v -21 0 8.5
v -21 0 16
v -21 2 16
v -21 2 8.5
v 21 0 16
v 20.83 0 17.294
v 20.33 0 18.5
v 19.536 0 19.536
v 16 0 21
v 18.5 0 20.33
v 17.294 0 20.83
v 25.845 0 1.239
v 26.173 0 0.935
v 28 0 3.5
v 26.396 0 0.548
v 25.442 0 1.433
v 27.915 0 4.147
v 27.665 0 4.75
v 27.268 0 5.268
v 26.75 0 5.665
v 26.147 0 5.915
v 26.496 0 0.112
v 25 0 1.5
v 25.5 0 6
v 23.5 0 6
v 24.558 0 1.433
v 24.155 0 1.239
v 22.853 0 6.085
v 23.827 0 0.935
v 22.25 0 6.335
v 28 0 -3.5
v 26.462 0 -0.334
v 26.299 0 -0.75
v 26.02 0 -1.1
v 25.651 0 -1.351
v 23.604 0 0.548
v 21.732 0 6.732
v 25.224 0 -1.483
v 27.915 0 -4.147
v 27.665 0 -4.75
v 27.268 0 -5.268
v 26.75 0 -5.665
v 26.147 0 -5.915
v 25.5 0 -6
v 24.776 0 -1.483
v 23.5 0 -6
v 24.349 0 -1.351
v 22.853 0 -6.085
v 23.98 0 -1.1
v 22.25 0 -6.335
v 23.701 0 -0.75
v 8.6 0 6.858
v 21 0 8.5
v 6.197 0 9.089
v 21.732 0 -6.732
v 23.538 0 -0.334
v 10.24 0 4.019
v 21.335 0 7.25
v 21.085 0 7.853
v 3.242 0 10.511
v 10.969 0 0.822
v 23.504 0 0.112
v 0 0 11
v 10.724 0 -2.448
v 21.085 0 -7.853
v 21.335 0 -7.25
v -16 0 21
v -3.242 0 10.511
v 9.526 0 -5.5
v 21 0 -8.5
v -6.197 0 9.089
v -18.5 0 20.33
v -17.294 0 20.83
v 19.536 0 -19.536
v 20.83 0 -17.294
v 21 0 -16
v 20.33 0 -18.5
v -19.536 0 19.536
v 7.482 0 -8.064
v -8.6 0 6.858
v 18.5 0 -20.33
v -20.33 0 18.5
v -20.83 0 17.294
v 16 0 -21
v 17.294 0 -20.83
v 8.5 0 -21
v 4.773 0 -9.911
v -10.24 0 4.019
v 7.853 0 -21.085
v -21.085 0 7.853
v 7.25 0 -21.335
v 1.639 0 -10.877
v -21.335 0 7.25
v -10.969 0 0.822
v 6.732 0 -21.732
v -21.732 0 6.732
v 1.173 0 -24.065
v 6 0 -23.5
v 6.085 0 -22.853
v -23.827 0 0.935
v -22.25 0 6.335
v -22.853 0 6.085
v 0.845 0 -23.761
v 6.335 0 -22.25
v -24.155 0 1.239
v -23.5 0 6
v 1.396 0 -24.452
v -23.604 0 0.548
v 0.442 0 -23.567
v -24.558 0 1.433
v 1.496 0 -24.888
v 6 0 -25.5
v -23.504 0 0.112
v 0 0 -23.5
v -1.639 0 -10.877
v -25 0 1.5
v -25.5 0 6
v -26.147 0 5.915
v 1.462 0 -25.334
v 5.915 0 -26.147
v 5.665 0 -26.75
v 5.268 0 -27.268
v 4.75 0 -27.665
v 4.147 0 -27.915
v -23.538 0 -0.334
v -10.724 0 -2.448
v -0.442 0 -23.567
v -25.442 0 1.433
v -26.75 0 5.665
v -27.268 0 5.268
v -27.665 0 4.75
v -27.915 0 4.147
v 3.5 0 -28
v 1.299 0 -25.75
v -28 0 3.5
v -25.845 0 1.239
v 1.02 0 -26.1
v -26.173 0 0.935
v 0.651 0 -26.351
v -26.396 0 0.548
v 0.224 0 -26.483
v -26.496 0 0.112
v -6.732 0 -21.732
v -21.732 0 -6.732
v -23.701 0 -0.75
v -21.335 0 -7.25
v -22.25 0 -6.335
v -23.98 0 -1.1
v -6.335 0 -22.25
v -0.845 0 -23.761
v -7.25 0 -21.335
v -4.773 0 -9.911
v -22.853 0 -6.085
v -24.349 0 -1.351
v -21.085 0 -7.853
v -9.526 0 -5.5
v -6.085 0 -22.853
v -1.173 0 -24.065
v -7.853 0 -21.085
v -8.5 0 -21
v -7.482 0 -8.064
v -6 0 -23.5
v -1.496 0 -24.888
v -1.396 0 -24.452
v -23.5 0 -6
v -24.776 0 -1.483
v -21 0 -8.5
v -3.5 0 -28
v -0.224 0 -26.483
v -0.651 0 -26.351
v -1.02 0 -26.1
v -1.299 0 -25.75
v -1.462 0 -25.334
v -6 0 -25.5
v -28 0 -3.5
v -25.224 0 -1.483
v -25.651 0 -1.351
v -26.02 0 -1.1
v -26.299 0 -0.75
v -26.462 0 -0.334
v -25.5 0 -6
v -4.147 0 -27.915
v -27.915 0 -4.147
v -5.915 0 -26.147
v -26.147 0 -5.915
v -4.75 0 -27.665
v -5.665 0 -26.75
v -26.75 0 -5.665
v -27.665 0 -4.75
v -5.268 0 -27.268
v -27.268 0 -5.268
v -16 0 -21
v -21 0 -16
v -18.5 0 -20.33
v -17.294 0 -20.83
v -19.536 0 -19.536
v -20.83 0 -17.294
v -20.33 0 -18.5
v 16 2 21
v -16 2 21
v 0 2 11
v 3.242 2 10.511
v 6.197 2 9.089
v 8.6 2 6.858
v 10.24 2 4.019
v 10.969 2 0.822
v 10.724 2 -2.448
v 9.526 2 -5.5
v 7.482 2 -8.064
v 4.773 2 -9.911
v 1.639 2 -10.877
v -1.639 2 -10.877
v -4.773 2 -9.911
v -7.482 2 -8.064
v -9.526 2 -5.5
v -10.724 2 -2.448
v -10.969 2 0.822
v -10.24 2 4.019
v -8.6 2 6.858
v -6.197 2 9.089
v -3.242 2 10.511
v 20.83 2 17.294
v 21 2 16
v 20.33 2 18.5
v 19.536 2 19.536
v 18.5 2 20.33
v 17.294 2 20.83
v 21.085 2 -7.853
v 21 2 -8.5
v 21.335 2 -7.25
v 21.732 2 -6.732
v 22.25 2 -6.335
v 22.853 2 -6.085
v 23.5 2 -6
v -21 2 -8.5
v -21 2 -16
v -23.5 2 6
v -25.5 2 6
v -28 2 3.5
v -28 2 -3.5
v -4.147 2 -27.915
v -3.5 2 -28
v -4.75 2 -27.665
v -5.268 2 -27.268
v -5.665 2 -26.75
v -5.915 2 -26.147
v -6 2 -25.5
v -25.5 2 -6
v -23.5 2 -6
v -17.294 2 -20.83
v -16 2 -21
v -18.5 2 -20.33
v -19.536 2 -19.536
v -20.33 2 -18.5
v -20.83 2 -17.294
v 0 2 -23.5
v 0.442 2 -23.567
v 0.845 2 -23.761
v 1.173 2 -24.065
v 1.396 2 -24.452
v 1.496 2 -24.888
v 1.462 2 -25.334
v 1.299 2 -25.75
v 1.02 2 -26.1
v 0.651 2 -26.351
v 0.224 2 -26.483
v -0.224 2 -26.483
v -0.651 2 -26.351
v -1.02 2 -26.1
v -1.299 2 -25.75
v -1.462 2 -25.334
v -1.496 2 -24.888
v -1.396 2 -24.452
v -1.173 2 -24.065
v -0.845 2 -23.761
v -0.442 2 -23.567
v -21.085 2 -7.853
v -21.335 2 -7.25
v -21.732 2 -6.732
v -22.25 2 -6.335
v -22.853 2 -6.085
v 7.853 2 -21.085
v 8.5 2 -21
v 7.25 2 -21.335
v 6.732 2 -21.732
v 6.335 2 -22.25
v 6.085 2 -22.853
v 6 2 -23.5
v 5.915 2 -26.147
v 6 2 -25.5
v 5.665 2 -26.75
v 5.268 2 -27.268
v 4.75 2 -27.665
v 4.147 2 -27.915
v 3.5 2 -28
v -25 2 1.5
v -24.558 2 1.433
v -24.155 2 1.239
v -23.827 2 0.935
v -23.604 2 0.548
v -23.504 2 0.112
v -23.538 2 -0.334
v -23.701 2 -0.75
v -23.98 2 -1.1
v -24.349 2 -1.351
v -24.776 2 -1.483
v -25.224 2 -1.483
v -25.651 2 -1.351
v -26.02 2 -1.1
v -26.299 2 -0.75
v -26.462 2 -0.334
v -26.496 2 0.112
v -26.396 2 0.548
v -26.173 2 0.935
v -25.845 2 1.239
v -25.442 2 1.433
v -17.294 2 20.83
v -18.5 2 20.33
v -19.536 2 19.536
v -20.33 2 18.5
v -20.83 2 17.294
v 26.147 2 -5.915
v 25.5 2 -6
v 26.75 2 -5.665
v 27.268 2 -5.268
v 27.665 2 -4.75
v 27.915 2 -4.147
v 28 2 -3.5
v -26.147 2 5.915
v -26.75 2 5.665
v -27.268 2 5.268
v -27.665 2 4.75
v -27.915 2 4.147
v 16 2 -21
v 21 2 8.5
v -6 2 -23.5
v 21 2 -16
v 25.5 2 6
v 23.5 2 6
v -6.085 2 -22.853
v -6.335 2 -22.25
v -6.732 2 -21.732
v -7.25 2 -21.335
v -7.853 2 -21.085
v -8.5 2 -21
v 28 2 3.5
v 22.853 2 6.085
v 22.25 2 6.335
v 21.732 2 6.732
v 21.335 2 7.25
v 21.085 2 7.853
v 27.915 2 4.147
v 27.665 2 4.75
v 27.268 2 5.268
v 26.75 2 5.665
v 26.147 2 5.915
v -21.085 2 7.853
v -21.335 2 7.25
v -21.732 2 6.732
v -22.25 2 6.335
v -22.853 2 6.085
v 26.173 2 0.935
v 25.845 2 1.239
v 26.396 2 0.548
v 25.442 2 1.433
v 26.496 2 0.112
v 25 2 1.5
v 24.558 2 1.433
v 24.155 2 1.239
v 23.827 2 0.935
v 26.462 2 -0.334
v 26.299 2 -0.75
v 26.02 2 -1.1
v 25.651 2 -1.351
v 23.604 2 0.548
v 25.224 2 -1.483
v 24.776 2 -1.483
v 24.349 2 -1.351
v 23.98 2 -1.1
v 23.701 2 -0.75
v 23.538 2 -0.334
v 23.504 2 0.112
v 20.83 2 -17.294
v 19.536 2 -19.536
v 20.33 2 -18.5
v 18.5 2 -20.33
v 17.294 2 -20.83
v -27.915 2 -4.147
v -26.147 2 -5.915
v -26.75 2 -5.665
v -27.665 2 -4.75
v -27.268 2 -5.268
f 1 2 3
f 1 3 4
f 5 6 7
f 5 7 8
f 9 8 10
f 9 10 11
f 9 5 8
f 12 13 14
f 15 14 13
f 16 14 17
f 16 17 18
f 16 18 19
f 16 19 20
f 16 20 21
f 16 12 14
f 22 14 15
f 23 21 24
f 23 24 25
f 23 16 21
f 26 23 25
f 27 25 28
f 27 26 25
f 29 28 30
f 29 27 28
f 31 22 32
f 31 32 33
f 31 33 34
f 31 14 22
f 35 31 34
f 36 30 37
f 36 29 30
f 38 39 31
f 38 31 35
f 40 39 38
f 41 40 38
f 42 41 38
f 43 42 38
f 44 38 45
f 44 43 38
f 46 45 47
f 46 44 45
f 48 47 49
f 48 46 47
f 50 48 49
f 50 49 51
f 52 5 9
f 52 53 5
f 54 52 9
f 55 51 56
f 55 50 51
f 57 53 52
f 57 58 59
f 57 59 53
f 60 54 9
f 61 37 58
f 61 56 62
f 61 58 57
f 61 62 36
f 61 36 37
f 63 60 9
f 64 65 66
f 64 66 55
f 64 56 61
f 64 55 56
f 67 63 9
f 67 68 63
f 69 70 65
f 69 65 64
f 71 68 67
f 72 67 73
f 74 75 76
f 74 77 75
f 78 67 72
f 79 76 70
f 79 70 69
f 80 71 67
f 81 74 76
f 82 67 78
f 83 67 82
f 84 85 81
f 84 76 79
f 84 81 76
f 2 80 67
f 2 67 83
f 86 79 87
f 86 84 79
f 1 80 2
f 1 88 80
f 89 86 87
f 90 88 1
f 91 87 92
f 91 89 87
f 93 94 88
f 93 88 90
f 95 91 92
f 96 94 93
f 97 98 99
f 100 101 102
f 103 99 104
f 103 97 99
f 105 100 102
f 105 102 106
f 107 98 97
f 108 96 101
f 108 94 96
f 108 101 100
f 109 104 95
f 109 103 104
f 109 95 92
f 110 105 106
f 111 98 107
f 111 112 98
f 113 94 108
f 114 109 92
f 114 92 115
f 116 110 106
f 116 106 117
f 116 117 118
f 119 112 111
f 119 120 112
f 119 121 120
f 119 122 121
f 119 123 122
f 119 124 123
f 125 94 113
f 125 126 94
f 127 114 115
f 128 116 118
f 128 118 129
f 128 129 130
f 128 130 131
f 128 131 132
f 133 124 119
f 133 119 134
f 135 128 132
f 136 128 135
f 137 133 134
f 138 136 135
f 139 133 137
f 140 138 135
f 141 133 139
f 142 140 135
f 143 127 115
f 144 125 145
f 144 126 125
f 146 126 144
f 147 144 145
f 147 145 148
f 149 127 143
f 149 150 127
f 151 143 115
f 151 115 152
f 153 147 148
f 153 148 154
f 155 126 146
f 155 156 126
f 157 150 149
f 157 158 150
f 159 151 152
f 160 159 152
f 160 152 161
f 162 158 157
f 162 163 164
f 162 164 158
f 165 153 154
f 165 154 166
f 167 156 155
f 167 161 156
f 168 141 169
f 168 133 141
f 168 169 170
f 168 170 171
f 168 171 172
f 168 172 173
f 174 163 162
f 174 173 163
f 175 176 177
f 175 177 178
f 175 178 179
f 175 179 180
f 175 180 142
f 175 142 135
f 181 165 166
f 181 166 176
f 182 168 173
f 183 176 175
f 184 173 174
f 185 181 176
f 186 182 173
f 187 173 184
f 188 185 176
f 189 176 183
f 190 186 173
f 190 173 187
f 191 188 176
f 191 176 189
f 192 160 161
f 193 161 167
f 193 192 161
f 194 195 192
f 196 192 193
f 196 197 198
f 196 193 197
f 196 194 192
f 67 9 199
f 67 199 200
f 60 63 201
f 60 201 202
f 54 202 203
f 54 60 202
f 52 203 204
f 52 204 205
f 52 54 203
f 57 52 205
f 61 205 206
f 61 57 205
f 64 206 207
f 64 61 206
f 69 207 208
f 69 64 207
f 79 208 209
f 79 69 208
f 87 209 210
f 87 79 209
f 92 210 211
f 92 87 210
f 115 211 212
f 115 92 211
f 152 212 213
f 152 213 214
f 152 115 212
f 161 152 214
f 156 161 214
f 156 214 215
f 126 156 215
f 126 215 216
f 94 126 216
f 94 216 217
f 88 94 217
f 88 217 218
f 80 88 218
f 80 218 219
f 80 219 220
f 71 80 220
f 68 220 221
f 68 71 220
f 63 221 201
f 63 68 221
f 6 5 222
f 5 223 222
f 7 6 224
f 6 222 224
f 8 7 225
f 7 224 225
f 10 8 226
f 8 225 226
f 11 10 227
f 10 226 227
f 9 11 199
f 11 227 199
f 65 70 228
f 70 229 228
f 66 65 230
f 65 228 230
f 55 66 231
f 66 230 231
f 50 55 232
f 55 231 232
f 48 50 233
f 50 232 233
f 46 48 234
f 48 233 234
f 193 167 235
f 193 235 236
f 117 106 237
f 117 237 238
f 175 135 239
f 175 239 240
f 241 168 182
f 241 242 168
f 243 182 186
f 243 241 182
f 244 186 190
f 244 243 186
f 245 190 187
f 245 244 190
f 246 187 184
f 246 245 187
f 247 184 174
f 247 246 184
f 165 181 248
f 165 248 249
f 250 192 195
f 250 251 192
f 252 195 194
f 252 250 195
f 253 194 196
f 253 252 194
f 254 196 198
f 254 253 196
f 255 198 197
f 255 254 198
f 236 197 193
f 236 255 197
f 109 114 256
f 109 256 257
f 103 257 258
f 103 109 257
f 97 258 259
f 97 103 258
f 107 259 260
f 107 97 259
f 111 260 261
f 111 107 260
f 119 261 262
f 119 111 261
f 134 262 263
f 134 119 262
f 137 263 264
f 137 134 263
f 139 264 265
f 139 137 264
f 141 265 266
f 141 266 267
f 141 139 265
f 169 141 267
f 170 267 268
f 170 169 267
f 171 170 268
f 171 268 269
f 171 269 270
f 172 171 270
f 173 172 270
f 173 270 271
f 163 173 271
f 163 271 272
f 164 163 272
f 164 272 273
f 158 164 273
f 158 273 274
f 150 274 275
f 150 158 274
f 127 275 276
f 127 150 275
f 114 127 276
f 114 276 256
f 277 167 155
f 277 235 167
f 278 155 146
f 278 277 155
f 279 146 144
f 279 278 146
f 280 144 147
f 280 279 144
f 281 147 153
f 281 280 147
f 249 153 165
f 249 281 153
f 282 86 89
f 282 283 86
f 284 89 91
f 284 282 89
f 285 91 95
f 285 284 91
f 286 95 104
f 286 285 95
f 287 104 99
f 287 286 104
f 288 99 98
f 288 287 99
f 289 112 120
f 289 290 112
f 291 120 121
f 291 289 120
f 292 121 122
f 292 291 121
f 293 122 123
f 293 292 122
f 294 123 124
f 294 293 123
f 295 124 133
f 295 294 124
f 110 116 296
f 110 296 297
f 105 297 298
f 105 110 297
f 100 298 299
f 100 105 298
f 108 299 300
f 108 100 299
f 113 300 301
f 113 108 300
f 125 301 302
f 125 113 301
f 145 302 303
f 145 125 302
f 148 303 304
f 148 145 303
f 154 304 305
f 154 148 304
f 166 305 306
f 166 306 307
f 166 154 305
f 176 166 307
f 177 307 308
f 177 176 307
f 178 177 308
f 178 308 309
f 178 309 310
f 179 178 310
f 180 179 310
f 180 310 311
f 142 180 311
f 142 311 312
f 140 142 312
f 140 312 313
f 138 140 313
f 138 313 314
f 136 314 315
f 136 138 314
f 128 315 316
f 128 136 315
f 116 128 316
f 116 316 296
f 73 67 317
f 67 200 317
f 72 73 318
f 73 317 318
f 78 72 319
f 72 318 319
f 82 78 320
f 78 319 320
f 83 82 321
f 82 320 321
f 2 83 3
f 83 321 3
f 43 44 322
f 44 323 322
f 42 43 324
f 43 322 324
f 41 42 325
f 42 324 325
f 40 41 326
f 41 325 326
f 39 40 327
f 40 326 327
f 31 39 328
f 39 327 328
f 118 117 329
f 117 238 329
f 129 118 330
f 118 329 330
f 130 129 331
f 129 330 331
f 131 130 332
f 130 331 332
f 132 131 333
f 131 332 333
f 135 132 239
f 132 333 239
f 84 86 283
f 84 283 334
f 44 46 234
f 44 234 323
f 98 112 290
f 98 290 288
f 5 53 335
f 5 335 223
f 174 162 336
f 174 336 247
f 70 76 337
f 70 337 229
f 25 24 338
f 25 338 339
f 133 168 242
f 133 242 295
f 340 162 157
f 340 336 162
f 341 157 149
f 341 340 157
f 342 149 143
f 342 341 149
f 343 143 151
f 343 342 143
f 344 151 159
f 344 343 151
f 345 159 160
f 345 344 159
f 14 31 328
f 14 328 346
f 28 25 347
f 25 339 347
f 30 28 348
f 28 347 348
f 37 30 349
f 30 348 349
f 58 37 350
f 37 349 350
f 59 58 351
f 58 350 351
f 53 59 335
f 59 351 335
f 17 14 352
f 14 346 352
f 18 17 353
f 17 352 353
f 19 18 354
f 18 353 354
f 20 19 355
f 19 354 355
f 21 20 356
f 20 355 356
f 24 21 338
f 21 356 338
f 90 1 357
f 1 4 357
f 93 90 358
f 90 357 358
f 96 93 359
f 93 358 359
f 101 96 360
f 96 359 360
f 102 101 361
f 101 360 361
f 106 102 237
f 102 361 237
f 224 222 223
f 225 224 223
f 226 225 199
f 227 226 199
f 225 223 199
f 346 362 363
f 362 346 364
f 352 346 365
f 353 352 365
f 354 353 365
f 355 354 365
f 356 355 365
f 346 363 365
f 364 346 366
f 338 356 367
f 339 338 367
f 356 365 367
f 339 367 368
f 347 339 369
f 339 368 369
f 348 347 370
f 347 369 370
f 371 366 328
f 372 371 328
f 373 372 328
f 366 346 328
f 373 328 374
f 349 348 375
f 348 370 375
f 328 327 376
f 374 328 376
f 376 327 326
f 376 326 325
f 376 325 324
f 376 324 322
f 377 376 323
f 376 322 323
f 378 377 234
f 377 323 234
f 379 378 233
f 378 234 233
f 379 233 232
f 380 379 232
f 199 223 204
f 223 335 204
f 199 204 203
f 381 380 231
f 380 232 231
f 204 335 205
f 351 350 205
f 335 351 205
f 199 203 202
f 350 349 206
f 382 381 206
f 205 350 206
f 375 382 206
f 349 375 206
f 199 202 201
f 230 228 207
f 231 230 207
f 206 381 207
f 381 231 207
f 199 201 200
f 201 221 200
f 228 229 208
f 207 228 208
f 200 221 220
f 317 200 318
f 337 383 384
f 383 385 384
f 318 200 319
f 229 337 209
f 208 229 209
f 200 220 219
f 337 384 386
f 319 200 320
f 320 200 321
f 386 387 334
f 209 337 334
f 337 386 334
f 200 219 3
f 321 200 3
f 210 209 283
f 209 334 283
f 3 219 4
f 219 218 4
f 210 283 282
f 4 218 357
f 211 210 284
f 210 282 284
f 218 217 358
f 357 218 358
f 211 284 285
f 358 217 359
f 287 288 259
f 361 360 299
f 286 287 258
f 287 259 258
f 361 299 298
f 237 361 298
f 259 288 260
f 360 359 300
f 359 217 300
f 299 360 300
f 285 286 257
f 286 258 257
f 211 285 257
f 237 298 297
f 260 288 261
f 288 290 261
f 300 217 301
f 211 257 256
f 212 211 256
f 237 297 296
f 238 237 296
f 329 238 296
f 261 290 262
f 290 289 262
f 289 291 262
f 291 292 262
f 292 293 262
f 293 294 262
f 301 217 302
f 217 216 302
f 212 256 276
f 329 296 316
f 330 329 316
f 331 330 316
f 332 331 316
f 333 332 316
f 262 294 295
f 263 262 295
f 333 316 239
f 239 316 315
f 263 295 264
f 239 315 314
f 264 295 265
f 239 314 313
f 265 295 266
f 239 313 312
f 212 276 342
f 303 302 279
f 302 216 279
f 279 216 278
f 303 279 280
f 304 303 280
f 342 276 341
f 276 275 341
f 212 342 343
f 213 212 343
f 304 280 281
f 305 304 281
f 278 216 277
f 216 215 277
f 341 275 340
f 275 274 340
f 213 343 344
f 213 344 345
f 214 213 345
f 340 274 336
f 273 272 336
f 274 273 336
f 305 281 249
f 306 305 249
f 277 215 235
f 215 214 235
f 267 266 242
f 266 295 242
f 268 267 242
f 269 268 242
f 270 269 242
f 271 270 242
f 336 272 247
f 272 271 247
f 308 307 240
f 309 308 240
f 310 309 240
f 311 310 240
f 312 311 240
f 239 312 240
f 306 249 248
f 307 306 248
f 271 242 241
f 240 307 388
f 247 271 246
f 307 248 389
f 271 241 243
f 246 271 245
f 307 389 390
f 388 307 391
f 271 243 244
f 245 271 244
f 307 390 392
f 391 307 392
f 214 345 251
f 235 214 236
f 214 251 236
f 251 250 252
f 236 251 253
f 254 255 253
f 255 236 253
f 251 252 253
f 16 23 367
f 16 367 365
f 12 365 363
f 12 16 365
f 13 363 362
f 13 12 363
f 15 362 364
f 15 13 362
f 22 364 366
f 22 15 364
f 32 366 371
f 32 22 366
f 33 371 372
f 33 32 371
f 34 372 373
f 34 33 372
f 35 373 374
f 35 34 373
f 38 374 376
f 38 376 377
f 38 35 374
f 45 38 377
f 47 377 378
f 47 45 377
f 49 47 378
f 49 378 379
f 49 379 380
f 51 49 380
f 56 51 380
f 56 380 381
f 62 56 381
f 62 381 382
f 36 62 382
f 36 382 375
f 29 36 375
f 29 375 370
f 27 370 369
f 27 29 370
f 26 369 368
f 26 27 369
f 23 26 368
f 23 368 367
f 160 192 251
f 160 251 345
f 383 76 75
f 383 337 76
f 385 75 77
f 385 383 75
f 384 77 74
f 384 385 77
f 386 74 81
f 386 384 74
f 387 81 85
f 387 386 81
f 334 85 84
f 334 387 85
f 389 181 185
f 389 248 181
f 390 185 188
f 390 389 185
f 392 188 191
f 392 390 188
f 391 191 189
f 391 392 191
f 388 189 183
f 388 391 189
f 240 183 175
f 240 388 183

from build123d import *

# Parameters (mm, degrees)
SKETCH1_R           = 11
SKETCH1_R_2         = 1.5
BOSS_EXTRUDE1_DEPTH = 2
FILLET2_R           = 5
FILLET1_R           = 2.5


with BuildPart() as part:
    # Sketch1 → Boss-Extrude1 (new body)
    with BuildSketch(Plane(origin=(0, 0, 0), x_dir=(1, 0, 0), z_dir=(0, 1, 0))):
        Polygon((21, 6), (28, 6), (28, -6), (21, -6), (21, -21), (-21, -21), (-21, -6), (-28, -6), (-28, 6), (-21, 6), (-21, 21), (-6, 21), (-6, 28), (6, 28), (6, 21), (21, 21), align=None)
        with Locations(Location((0, 0, 0), (0, 0, 270))):
            Circle(SKETCH1_R, mode=Mode.SUBTRACT)
        with Locations(Location((-25, 0, 0), (0, 0, 270))):
            Circle(SKETCH1_R_2, mode=Mode.SUBTRACT)
        with Locations(Location((0, 25, 0), (0, 0, 270))):
            Circle(SKETCH1_R_2, mode=Mode.SUBTRACT)
        with Locations(Location((25, 0, 0), (0, 0, 270))):
            Circle(SKETCH1_R_2, mode=Mode.SUBTRACT)
    extrude(amount=BOSS_EXTRUDE1_DEPTH)

    # Fillet2
    fillet2_edges = [part.edges().sort_by_distance(p)[0] for p in [
        (21, 1, 21),
        (-21, 1, 21),
        (-21, 1, -21),
        (21, 1, -21),
    ]]
    fillet(fillet2_edges, radius=FILLET2_R)

    # Fillet1
    fillet1_edges = [part.edges().sort_by_distance(p)[0] for p in [
        (28, 1, 6),
        (21, 1, 6),
        (-21, 1, 6),
        (-28, 1, 6),
        (-28, 1, -6),
        (-21, 1, -6),
        (-6, 1, -21),
        (-6, 1, -28),
        (6, 1, -28),
        (6, 1, -21),
        (21, 1, -6),
        (28, 1, -6),
    ]]
    fillet(fillet1_edges, radius=FILLET1_R)


solid = part.part
